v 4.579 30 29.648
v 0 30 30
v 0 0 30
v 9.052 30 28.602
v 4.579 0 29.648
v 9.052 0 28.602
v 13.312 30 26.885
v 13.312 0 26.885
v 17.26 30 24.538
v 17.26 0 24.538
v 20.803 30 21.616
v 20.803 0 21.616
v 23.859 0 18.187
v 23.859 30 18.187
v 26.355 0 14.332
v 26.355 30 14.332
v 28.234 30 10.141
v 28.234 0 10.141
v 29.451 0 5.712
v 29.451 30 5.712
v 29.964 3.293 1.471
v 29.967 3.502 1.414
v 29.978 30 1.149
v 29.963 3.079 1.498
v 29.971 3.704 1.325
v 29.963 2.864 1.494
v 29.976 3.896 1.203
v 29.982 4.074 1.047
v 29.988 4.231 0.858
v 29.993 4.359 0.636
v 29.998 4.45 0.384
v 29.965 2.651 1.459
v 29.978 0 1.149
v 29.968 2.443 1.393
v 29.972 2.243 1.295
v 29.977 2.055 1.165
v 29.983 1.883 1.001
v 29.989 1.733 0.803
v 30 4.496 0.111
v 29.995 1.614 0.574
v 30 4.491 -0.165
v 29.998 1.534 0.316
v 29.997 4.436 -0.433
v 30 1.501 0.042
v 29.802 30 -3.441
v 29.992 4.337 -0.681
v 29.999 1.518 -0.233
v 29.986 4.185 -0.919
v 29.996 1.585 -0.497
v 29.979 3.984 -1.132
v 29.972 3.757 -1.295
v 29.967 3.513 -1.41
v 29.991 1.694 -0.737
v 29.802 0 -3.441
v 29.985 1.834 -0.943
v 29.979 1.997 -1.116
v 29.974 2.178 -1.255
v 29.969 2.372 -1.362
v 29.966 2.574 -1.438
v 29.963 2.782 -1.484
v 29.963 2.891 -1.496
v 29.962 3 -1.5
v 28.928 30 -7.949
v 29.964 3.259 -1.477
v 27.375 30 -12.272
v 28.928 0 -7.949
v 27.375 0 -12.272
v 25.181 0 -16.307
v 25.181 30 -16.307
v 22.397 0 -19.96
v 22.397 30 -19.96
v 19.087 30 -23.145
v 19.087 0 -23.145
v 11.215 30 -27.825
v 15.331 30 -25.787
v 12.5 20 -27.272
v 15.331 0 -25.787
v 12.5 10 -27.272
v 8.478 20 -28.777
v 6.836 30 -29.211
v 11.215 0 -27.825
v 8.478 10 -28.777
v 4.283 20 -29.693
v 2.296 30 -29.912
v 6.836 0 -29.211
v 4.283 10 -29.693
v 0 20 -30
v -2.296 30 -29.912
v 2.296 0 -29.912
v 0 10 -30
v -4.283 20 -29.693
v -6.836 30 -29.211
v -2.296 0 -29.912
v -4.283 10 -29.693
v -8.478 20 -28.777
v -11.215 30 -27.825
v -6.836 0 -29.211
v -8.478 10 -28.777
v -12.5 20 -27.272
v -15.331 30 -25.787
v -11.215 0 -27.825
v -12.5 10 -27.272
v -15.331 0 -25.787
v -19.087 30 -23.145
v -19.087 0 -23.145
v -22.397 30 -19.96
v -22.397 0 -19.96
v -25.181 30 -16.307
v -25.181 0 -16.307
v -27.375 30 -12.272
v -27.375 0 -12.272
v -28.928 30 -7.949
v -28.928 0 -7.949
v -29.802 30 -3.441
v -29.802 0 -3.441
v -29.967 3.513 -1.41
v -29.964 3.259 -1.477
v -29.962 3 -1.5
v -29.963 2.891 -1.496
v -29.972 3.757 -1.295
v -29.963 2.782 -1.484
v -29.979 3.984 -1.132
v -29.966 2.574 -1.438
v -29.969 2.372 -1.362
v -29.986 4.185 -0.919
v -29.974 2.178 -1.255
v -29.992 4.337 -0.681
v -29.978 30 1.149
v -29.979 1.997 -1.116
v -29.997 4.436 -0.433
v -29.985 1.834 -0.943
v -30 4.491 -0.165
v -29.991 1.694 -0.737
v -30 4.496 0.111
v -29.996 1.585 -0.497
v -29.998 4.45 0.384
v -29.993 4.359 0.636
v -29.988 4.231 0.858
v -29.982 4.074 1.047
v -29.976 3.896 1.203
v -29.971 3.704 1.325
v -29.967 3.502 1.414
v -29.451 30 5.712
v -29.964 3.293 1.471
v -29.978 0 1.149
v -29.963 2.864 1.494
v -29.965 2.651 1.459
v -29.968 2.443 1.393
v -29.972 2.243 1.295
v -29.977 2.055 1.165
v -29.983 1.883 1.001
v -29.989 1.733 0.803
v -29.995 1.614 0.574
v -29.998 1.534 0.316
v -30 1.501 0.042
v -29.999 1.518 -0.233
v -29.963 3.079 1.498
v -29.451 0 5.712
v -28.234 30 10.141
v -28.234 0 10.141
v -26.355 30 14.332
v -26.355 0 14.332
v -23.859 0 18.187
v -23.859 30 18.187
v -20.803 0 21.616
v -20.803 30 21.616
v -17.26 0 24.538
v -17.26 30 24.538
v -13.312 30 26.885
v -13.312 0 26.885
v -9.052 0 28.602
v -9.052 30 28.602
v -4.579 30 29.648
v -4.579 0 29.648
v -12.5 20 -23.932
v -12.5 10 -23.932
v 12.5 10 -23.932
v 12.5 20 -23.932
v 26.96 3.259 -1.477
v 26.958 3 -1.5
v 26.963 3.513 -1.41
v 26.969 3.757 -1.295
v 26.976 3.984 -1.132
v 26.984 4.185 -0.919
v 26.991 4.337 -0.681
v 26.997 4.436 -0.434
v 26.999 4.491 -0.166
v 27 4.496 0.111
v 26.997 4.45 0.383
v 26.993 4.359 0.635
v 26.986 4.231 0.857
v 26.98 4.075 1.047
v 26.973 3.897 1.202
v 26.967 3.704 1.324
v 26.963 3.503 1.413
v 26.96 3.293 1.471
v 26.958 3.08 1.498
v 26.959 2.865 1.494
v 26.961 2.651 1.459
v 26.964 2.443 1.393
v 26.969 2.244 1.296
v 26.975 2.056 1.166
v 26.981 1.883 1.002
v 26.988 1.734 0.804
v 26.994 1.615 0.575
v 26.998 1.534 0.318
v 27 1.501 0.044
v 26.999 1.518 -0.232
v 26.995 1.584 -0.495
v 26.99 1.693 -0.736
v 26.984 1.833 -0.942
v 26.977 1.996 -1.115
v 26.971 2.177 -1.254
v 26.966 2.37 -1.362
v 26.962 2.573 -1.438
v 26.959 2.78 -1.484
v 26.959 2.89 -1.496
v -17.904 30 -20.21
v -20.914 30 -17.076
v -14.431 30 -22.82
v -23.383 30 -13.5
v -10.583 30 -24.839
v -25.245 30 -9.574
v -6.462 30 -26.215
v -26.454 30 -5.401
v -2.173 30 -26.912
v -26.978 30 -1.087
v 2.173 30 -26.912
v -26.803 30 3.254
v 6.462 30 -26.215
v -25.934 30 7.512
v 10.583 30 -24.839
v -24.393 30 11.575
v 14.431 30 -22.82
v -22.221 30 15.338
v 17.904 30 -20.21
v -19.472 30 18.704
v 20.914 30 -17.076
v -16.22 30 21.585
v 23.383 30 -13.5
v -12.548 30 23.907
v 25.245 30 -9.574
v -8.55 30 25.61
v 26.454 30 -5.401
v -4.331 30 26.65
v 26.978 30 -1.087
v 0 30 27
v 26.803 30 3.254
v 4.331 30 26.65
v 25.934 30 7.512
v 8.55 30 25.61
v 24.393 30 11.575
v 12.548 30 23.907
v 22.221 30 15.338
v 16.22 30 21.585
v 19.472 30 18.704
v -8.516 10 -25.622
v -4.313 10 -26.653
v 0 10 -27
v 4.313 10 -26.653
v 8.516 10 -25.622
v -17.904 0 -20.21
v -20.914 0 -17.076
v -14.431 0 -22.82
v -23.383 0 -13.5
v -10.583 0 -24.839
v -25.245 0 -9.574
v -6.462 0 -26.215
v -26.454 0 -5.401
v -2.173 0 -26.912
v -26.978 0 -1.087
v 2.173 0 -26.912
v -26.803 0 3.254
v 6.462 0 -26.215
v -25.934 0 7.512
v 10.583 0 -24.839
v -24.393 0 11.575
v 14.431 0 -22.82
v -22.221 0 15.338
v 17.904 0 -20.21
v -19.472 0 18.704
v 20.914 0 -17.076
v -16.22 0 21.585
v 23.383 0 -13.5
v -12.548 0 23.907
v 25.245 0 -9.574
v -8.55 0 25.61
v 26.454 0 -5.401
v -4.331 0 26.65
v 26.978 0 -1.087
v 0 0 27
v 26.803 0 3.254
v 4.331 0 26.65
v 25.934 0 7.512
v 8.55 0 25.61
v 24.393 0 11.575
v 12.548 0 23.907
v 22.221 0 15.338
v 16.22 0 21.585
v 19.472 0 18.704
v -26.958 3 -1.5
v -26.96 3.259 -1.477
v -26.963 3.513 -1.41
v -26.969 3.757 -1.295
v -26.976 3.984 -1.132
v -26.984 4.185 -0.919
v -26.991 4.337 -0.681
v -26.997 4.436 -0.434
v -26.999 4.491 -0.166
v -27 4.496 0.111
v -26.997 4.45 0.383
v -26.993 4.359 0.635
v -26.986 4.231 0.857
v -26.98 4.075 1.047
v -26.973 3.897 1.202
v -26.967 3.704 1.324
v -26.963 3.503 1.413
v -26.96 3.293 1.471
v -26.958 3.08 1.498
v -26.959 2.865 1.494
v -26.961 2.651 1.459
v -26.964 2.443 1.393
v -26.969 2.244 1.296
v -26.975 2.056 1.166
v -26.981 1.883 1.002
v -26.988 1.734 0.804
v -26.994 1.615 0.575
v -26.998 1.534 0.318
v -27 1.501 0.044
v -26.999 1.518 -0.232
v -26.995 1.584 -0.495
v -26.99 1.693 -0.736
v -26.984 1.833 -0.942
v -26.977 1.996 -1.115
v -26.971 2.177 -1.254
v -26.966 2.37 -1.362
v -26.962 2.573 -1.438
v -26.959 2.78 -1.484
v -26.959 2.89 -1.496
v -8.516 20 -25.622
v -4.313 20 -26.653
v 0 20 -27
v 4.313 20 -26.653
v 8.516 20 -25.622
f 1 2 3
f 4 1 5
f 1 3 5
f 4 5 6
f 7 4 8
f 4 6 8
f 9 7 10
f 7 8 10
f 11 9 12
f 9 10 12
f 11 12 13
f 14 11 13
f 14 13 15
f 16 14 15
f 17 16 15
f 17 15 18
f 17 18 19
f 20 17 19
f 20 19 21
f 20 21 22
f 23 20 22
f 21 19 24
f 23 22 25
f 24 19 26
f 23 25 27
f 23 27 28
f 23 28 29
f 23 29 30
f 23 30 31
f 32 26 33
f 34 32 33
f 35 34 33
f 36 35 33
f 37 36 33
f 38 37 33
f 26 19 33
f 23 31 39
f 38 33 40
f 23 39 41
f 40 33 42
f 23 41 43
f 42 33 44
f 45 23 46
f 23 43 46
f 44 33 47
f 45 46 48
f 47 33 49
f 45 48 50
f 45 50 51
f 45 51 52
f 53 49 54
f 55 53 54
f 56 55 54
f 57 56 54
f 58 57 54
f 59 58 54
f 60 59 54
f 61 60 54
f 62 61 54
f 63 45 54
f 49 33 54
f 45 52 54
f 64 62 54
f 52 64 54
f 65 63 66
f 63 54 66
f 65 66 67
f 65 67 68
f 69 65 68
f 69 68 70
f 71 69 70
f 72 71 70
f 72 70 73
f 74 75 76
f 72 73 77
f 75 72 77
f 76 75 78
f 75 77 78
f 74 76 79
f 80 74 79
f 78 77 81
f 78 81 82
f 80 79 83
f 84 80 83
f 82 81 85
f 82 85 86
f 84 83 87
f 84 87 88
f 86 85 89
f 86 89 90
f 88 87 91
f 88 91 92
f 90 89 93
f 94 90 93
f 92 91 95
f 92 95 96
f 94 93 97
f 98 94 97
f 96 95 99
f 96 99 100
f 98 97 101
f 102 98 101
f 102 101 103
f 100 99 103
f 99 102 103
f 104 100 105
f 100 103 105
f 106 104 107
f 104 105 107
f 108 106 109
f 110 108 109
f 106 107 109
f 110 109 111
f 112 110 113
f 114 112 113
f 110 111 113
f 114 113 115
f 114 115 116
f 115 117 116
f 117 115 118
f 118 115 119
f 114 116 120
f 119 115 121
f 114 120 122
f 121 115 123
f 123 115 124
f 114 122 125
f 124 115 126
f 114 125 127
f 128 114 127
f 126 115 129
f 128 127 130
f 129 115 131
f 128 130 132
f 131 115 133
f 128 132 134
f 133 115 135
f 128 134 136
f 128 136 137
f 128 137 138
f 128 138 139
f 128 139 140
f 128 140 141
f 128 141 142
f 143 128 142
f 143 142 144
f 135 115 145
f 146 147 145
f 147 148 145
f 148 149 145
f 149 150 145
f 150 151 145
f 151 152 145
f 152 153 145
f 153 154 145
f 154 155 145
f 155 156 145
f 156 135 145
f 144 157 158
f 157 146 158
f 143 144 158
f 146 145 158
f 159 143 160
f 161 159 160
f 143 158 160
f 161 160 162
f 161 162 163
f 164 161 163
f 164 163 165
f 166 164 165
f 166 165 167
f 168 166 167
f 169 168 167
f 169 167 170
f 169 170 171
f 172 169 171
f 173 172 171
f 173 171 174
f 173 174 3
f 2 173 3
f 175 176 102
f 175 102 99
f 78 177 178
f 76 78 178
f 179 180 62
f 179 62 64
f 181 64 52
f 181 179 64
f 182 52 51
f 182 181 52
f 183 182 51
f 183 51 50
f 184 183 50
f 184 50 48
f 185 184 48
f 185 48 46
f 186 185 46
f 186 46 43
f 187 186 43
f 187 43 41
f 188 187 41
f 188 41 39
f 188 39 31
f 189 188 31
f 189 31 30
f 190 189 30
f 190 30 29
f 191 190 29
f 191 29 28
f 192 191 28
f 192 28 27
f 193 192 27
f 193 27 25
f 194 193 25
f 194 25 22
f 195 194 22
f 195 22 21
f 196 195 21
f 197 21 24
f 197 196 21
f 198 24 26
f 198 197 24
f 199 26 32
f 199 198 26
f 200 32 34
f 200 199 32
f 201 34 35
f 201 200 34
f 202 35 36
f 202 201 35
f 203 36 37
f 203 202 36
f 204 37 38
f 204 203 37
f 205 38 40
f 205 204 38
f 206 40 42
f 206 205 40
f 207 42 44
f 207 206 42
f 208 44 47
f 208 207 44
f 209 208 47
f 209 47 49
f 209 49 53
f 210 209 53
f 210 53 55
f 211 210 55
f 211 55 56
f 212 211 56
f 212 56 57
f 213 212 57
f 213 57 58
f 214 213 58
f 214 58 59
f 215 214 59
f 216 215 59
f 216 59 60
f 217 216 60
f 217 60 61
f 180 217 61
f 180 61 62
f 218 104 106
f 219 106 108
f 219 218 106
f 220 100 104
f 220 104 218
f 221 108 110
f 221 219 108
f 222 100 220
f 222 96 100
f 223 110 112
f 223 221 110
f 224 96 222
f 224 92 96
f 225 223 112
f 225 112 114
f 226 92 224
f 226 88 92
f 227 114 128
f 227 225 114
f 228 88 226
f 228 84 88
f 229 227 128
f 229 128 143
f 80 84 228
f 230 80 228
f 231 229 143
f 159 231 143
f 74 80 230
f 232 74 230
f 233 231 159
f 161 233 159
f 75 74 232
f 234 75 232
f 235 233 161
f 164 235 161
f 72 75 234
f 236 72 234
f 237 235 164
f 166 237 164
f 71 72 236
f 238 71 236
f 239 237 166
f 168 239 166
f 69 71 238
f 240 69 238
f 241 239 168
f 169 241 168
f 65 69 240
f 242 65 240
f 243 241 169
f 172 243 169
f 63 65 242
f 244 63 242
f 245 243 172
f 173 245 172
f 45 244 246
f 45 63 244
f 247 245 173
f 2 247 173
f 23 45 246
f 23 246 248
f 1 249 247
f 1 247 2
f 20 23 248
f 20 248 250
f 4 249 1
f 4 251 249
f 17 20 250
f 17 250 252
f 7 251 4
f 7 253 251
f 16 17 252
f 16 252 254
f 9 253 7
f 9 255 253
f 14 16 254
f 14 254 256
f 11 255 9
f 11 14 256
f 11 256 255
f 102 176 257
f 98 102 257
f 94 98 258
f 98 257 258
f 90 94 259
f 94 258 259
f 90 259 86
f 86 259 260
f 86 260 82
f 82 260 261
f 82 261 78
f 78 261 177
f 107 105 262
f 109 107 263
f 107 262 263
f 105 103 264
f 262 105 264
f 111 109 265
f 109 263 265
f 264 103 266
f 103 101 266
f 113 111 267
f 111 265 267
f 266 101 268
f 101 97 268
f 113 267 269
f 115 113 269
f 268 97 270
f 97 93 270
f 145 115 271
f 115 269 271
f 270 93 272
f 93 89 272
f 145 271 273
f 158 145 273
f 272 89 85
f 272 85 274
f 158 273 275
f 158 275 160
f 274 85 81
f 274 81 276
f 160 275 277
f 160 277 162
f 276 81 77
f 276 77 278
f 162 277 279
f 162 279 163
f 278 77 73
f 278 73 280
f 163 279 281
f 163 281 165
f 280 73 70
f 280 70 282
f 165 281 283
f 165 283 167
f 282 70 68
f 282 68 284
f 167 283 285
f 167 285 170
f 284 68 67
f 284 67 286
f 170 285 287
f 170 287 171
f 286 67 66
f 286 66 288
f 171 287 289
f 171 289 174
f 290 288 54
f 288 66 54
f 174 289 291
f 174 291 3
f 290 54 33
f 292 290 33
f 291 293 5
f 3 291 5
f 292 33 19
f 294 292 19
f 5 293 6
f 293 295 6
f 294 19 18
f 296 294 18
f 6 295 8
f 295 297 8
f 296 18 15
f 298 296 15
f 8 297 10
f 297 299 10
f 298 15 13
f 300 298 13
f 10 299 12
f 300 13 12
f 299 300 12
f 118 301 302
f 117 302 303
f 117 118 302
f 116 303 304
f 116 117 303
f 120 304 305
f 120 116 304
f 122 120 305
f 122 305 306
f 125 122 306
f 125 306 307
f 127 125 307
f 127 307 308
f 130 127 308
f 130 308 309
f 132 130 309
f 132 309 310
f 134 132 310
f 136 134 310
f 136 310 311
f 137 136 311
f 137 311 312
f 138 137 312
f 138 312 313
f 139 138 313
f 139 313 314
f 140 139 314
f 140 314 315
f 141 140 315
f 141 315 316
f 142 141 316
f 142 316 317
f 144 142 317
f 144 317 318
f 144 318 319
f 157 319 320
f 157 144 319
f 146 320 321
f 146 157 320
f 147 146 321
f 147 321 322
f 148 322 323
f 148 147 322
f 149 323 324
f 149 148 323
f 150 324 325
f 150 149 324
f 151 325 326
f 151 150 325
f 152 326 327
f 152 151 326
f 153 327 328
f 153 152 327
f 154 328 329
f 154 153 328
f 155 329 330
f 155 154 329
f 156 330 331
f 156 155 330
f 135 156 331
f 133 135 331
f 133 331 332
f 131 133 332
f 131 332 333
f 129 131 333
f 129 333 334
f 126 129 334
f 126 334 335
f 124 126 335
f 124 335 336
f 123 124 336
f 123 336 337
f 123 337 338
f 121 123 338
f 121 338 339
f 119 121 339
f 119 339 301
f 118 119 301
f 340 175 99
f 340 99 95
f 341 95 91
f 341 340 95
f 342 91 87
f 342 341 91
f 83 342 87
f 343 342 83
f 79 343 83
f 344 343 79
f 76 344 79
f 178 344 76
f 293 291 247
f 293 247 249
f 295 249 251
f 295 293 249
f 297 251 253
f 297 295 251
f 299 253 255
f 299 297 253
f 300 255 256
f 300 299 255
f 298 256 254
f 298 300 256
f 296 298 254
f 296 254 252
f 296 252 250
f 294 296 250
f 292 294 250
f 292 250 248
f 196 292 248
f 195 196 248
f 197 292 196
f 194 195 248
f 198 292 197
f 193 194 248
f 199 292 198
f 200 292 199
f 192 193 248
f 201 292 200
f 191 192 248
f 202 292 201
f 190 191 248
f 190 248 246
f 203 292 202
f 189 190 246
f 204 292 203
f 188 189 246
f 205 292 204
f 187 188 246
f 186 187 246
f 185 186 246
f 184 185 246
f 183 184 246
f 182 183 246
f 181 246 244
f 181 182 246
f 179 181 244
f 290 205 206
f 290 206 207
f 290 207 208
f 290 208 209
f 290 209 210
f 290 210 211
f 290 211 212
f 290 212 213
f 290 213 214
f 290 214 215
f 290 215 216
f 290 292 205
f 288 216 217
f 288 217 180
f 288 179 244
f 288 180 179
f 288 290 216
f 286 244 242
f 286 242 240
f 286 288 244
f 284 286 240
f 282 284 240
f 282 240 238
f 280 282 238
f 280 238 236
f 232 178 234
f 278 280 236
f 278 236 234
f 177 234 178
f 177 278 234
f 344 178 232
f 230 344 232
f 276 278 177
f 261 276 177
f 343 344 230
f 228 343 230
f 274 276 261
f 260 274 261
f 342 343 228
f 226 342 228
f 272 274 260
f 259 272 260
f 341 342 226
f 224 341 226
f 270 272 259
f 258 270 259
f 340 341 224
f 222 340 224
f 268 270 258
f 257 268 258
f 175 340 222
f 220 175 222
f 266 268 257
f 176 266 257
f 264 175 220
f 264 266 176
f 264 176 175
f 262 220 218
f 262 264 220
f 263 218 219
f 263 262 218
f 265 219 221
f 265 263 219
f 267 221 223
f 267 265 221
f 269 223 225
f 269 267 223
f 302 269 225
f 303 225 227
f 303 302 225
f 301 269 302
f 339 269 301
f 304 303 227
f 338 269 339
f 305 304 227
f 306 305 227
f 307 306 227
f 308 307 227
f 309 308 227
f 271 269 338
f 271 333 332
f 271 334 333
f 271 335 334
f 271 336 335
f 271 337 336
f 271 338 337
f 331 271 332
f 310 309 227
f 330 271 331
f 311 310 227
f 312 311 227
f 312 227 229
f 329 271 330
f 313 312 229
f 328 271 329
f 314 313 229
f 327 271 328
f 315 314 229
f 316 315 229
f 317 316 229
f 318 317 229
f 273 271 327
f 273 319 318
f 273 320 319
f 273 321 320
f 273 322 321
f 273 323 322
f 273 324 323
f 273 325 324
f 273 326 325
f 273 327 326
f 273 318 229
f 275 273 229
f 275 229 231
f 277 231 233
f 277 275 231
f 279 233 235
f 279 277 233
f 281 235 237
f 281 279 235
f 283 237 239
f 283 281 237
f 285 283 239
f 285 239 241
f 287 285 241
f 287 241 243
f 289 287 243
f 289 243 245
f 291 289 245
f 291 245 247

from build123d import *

# Parameters (mm, degrees)
SKETCH2_R               = 30
SKETCH2_R_2             = 27
BOSS_EXTRUDE1_DEPTH     = 30
SKETCH3_W               = 25
SKETCH3_H               = 10
CUT_EXTRUDE3_DEPTH      = 50
CUT_EXTRUDE4_DEPTH      = 52.961524227
CUT_EXTRUDE4_DEPTH_BACK = 52.961524227
SKETCH6_R               = 1.5


with BuildPart() as part:
    # Sketch2 → Boss-Extrude1 (new body)
    with BuildSketch(Plane(origin=(0, 0, 0), x_dir=(1, 0, 0), z_dir=(0, 1, 0))):
        with Locations(Location((0, 0, 0), (0, 0, 270))):
            Circle(SKETCH2_R)
        with Locations(Location((0, 0, 0), (0, 0, 270))):
            Circle(SKETCH2_R_2, mode=Mode.SUBTRACT)
    extrude(amount=BOSS_EXTRUDE1_DEPTH)

    # Sketch3 → Cut-Extrude3 (cut)
    with BuildSketch(Plane.XY):
        with Locations((0, 15)):
            Rectangle(SKETCH3_W, SKETCH3_H)
    extrude(amount=-CUT_EXTRUDE3_DEPTH, mode=Mode.SUBTRACT)

    # Sketch6 → Cut-Extrude4 (cut, two sides: drawn at the far end of the back side and taken through both)
    with BuildSketch(Plane(origin=(0, 0, 0), x_dir=(0, 0, -1), z_dir=(1, 0, 0)).offset(-CUT_EXTRUDE4_DEPTH_BACK)):
        with Locations((0, 3)):
            Circle(SKETCH6_R)
    extrude(amount=CUT_EXTRUDE4_DEPTH + CUT_EXTRUDE4_DEPTH_BACK, mode=Mode.SUBTRACT)


solid = part.part
